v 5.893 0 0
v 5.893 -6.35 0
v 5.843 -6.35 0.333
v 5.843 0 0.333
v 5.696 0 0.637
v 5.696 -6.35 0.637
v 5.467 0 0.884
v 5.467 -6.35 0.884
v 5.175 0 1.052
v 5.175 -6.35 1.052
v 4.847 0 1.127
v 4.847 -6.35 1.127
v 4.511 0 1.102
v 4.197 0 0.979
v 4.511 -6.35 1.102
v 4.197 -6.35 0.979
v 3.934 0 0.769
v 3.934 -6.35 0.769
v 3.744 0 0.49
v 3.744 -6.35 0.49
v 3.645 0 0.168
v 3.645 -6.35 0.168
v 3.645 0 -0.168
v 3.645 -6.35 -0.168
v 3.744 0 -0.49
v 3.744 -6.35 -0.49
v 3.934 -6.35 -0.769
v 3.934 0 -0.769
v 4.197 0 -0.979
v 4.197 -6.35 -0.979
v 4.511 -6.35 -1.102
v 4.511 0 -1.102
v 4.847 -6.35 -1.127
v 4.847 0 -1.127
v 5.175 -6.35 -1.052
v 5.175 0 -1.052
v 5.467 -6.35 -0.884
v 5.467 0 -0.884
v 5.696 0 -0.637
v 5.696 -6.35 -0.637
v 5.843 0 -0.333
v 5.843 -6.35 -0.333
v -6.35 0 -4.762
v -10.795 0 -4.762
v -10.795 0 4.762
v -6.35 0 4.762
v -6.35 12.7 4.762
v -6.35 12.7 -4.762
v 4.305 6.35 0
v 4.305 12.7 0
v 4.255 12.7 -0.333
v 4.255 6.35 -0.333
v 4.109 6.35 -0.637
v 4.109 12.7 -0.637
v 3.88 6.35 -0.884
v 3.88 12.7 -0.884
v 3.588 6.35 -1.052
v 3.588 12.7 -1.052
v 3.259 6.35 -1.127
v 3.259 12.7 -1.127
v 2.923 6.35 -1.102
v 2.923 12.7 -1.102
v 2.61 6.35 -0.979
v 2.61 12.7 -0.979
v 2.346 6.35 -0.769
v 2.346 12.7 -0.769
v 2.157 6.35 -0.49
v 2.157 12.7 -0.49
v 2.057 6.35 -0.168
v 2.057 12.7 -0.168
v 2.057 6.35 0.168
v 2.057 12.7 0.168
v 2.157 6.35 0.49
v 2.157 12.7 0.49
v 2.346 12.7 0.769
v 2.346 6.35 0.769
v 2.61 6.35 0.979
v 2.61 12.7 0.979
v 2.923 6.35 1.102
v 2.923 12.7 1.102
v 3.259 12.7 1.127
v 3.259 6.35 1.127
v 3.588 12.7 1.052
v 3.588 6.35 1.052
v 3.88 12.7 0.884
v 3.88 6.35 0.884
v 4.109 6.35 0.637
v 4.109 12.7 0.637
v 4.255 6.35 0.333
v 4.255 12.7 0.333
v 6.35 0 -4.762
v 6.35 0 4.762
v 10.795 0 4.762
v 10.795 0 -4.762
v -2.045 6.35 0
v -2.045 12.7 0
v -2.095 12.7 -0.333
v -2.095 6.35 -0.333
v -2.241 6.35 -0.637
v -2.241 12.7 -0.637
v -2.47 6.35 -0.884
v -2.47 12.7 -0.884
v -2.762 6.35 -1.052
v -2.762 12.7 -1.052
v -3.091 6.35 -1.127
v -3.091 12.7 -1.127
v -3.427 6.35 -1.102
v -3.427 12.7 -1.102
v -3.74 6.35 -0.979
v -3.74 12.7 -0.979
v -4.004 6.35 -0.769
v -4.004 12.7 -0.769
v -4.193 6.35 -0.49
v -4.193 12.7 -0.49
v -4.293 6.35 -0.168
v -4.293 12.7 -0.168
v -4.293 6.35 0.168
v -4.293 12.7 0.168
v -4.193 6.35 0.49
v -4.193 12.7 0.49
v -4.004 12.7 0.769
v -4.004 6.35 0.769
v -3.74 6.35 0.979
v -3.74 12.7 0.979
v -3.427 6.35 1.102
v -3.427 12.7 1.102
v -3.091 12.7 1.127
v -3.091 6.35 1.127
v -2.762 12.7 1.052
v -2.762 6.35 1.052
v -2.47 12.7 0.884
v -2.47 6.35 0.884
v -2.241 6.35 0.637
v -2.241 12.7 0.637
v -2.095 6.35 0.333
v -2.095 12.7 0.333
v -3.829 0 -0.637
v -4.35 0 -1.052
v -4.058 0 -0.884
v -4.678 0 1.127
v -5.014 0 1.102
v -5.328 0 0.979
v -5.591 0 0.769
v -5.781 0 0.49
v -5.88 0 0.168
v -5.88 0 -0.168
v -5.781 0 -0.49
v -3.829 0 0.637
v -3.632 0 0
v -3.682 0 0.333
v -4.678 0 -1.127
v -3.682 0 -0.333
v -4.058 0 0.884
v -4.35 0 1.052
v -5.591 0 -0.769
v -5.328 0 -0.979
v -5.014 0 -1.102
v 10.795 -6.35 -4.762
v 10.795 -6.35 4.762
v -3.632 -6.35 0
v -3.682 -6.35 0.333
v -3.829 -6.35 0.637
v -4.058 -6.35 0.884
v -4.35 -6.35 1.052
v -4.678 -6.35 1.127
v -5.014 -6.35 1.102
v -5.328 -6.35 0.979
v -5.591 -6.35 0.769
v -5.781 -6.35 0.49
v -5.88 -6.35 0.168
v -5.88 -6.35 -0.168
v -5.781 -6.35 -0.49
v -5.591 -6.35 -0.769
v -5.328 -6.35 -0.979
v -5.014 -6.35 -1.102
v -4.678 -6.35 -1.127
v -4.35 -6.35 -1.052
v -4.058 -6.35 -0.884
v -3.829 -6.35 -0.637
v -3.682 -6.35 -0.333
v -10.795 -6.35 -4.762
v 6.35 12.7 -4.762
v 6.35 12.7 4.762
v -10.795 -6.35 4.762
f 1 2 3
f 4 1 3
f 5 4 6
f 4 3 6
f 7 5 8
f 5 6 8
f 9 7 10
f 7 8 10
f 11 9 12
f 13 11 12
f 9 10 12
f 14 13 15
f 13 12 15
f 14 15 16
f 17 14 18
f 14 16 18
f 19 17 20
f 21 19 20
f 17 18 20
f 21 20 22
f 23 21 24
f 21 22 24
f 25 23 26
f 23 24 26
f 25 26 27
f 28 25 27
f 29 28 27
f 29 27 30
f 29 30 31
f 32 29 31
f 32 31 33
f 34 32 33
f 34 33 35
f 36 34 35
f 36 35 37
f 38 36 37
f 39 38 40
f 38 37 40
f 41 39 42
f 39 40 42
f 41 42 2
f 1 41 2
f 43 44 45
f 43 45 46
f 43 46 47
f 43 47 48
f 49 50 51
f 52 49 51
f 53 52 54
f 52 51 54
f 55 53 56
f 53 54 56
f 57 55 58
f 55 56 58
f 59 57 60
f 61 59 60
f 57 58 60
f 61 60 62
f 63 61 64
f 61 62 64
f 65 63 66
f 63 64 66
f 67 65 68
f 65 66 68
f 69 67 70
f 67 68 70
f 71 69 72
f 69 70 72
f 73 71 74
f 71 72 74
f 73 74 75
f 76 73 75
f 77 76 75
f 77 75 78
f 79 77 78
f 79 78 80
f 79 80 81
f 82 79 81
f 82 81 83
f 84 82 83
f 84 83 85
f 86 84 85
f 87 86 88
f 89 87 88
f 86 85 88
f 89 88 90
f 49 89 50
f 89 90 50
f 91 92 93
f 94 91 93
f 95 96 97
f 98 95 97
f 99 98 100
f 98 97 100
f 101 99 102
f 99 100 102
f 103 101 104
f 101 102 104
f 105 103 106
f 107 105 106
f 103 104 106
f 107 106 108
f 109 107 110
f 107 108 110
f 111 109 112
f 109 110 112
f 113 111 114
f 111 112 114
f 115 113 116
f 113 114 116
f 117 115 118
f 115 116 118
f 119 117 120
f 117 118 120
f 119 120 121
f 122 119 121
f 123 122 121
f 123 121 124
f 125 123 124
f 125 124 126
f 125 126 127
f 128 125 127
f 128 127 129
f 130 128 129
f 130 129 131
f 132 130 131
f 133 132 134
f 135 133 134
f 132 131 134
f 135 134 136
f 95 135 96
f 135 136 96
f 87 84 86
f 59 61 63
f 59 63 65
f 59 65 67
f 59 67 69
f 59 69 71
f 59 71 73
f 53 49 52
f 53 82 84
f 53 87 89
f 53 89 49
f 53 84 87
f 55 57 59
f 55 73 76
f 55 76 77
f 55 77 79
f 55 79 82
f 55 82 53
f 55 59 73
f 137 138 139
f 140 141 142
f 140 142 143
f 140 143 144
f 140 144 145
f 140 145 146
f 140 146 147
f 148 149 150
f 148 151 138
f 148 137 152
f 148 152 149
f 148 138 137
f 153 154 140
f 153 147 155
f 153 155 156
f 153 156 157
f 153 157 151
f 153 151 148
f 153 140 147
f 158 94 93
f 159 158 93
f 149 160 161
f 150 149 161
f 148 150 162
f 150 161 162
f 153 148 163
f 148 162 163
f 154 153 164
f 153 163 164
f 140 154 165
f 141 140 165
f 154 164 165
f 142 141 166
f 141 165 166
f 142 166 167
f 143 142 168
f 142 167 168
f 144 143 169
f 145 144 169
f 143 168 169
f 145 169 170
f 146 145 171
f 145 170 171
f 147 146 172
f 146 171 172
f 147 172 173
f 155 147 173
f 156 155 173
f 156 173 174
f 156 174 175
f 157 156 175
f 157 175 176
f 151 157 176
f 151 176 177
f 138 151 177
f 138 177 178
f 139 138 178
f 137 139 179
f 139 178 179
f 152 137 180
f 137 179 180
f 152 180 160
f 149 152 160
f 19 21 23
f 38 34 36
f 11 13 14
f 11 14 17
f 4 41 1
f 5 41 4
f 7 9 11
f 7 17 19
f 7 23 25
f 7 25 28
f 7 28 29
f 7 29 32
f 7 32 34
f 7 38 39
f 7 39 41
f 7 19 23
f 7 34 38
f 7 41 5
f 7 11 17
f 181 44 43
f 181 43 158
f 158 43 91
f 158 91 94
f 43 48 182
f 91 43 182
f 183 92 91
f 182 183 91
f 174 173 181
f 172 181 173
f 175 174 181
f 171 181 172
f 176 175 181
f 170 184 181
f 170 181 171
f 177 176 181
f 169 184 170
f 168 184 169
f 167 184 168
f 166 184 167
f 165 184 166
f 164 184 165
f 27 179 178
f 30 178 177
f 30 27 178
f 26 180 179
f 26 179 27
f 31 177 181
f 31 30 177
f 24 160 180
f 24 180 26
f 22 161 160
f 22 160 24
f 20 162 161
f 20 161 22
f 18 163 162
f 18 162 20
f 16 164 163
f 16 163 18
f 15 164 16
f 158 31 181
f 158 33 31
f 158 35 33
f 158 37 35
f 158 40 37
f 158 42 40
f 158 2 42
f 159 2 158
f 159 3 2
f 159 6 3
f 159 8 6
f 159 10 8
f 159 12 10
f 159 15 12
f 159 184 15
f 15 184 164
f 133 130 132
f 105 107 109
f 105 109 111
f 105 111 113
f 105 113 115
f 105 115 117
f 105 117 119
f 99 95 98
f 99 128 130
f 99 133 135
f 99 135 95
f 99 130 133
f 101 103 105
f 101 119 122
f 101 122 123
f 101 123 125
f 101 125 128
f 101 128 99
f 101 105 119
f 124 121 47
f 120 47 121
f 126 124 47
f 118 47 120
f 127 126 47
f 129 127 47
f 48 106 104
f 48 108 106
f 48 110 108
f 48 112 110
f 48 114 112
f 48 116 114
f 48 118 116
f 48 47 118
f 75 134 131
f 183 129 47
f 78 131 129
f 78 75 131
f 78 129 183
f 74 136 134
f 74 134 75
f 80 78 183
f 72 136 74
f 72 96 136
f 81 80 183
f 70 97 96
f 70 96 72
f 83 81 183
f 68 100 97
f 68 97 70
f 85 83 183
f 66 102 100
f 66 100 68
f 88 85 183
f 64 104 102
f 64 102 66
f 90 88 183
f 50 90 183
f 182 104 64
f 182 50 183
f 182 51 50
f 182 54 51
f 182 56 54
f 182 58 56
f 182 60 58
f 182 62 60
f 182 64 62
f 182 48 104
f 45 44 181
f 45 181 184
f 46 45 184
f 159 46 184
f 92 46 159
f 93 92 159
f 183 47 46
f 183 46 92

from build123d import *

# Parameters (mm, degrees)
SKETCH1_W           = 12.7
SKETCH1_H           = 9.525
BOSS_EXTRUDE1_DEPTH = 12.7
SKETCH2_R           = 1.1303
CUT_EXTRUDE1_DEPTH  = 6.35
SKETCH3_W           = 21.59
SKETCH3_H           = 9.525
BOSS_EXTRUDE2_DEPTH = 6.35
SKETCH4_R           = 1.1303
CUT_EXTRUDE2_DEPTH  = 6.35


with BuildPart() as part:
    # Sketch1 → Boss-Extrude1 (new body)
    with BuildSketch(Plane(origin=(0, 0, 0), x_dir=(1, 0, 0), z_dir=(0, 1, 0))):
        Rectangle(SKETCH1_W, SKETCH1_H)
    extrude(amount=BOSS_EXTRUDE1_DEPTH)

    # Sketch2 → Cut-Extrude1 (cut)
    with BuildSketch(Plane(origin=(0, 12.7, 0), x_dir=(1, 0, 0), z_dir=(0, 1, 0))):
        with Locations((-3.175, 0)):
            Circle(SKETCH2_R)
        with Locations((3.175, 0)):
            Circle(SKETCH2_R)
    extrude(amount=-CUT_EXTRUDE1_DEPTH, mode=Mode.SUBTRACT)

    # Sketch3 → Boss-Extrude2 (add)
    with BuildSketch(Plane.XZ):
        Rectangle(SKETCH3_W, SKETCH3_H)
    extrude(amount=BOSS_EXTRUDE2_DEPTH)

    # Sketch4 → Cut-Extrude2 (cut)
    with BuildSketch(Plane.XZ.offset(6.35)):
        with Locations((-4.7625, 0)):
            Circle(SKETCH4_R)
        with Locations((4.7625, 0)):
            Circle(SKETCH4_R)
    extrude(amount=-CUT_EXTRUDE2_DEPTH, mode=Mode.SUBTRACT)


solid = part.part
